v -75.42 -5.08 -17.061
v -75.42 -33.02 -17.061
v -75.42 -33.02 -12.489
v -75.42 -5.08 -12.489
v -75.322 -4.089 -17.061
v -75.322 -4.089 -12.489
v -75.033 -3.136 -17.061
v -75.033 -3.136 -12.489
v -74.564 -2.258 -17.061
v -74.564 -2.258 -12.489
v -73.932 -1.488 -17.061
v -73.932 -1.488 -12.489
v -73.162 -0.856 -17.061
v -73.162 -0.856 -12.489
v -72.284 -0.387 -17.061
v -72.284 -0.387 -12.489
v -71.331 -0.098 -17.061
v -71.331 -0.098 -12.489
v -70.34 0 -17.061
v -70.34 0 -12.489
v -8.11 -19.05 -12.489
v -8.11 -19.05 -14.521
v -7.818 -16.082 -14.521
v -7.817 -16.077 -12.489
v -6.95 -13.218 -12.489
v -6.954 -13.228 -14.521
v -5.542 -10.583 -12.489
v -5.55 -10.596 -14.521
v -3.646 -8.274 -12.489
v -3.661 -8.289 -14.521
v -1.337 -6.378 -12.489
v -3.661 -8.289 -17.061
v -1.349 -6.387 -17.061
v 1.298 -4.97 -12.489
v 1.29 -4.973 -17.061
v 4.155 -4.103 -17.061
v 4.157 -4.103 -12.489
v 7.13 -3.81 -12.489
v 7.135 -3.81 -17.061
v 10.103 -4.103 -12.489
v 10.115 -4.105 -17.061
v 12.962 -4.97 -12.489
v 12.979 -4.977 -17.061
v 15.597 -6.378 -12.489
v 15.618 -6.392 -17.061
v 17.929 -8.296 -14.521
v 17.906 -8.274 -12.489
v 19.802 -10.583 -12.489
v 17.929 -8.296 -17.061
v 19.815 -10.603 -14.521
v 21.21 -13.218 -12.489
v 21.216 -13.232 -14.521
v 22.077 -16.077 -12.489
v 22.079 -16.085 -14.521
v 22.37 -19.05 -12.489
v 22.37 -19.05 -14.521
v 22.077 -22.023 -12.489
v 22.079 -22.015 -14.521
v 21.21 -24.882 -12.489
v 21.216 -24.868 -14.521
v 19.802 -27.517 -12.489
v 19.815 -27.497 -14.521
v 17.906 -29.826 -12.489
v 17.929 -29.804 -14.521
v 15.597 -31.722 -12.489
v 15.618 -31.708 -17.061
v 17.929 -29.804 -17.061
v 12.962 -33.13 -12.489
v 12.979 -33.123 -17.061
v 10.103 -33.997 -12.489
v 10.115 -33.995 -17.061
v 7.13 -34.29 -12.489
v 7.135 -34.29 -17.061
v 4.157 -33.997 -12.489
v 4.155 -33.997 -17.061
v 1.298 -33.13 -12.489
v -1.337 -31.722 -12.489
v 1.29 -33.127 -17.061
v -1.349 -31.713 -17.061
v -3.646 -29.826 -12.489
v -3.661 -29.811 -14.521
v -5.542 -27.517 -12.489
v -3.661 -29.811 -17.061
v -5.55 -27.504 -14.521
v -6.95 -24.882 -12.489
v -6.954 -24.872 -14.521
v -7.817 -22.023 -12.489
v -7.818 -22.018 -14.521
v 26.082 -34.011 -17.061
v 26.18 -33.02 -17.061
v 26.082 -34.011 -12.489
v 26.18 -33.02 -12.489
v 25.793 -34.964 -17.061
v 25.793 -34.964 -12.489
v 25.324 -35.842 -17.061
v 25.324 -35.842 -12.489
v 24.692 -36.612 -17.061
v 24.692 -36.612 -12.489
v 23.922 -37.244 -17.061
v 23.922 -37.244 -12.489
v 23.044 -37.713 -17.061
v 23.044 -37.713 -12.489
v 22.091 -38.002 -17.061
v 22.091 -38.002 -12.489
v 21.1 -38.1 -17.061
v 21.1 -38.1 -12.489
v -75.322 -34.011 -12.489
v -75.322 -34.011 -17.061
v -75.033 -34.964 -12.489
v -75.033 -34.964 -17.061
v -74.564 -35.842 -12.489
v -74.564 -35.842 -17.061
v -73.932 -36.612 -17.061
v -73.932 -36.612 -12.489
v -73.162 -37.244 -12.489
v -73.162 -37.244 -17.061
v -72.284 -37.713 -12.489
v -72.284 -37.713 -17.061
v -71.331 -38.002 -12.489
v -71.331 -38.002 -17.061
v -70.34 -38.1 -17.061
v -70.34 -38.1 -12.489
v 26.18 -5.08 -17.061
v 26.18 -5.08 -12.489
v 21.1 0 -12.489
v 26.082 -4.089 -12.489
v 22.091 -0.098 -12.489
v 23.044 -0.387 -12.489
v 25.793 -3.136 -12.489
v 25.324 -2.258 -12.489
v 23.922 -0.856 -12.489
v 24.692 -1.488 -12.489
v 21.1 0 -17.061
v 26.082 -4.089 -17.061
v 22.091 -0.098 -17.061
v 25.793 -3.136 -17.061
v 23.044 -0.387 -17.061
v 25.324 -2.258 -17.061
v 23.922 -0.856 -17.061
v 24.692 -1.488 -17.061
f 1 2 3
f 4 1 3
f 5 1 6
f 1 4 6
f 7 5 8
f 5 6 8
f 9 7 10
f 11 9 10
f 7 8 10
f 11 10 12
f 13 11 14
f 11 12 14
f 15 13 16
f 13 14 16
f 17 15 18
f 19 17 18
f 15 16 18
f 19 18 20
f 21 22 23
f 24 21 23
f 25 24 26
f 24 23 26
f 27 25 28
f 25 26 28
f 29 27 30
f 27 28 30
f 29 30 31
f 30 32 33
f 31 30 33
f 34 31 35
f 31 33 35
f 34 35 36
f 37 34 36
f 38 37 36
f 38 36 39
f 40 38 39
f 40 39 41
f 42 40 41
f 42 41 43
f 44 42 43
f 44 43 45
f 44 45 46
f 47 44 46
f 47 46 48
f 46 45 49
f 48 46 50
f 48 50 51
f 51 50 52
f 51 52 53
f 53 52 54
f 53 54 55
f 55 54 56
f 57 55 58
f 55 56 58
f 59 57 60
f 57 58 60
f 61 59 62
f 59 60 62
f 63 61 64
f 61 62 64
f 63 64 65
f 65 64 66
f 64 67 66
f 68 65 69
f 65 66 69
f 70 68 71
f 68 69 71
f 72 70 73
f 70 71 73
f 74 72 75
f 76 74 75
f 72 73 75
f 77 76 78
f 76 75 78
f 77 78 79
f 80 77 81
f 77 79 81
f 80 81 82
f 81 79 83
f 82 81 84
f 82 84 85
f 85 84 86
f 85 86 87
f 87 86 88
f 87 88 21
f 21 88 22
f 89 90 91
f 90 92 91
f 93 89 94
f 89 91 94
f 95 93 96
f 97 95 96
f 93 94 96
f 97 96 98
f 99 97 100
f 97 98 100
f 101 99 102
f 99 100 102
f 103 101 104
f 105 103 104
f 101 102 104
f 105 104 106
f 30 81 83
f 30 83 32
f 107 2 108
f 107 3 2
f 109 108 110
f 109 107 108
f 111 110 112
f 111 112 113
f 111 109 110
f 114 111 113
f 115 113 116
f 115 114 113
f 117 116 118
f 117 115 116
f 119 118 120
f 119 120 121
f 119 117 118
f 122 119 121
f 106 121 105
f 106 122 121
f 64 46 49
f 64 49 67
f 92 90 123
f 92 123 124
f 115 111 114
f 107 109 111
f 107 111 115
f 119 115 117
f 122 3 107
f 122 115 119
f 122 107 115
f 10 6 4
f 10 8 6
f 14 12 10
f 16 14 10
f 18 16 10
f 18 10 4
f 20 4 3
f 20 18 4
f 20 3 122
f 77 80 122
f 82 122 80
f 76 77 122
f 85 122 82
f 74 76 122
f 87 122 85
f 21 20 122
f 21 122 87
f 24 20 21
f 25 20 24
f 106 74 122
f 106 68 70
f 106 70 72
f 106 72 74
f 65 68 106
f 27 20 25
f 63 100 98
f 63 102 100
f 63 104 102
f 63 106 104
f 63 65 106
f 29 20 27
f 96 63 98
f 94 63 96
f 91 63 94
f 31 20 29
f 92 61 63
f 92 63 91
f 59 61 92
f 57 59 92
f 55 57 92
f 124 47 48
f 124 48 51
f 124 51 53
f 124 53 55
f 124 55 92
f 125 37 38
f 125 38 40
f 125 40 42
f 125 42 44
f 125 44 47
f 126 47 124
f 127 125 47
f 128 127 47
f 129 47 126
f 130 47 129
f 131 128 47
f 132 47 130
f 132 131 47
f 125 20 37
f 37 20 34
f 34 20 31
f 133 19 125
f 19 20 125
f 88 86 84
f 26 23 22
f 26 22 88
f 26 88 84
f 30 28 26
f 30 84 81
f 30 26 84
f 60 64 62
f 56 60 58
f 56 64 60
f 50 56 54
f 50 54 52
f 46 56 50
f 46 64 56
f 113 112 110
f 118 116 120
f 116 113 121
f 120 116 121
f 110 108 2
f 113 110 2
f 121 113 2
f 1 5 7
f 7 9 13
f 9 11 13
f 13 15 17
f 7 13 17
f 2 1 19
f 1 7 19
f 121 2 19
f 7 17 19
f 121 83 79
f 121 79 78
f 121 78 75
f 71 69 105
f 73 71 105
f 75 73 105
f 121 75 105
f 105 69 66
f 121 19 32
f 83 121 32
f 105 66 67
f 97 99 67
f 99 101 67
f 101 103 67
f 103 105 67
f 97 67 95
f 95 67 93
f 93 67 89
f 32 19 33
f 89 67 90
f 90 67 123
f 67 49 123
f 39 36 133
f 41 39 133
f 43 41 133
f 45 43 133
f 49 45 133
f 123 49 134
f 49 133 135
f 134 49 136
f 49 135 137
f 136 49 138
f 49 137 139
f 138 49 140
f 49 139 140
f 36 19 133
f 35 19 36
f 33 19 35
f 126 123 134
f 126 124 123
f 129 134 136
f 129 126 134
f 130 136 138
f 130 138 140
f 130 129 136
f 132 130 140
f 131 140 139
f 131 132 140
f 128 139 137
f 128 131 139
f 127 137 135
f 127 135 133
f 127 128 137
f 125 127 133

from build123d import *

# Parameters (mm, degrees)
F0_W     = 101.6
F0_H     = 4.572
F1_DEPTH = 38.1
F2_R     = 5.08
F4_D     = 30.48
F6_START = -2.032
F6_DEPTH = 2.54


with BuildPart() as f1:
    # F0 (on Front) → F1 (new body)
    with BuildSketch(Plane.XZ):
        with Locations((-24.6199596018, -14.7750445657)):
            Rectangle(F0_W, F0_H)
    extrude(amount=F1_DEPTH)

    # F2
    f2_edges = [f1.edges().sort_by_distance(p)[0] for p in [
        (26.18004, -38.1, -14.775045),
        (26.18004, 0, -14.775045),
        (-75.41996, -38.1, -14.775045),
        (-75.41996, 0, -14.775045),
    ]]
    fillet(f2_edges, radius=F2_R)

    # F4 (through all)
    with Locations(Plane.XY.offset(-12.4890445657)):
        with Locations((7.1300403982, -19.05)):
            Hole(F4_D / 2)

    # F5 (on face) → F6 (join)
    with BuildSketch(Plane.XY.offset(-12.4890445657).offset(F6_START)):
        with BuildLine():
            ThreePointArc((22.3700403982, -19.05), (21.2159885399, -13.2324691706), (17.9286145516, -8.2960055675))
            Line((17.9286145516, -8.2960055675), (17.9286145516, -29.8039944325))
            ThreePointArc((17.9286145516, -29.8039944325), (21.2159885399, -24.8675308294), (22.3700403982, -19.05))
        make_face()
        with BuildLine():
            Line((-3.6613854484, -29.8111676038), (-3.6613854484, -8.2888323962))
            ThreePointArc((-3.6613854484, -8.2888323962), (-8.1099596018, -19.05), (-3.6613854484, -29.8111676038))
        make_face()
    extrude(amount=-F6_DEPTH)


solid = f1.part
